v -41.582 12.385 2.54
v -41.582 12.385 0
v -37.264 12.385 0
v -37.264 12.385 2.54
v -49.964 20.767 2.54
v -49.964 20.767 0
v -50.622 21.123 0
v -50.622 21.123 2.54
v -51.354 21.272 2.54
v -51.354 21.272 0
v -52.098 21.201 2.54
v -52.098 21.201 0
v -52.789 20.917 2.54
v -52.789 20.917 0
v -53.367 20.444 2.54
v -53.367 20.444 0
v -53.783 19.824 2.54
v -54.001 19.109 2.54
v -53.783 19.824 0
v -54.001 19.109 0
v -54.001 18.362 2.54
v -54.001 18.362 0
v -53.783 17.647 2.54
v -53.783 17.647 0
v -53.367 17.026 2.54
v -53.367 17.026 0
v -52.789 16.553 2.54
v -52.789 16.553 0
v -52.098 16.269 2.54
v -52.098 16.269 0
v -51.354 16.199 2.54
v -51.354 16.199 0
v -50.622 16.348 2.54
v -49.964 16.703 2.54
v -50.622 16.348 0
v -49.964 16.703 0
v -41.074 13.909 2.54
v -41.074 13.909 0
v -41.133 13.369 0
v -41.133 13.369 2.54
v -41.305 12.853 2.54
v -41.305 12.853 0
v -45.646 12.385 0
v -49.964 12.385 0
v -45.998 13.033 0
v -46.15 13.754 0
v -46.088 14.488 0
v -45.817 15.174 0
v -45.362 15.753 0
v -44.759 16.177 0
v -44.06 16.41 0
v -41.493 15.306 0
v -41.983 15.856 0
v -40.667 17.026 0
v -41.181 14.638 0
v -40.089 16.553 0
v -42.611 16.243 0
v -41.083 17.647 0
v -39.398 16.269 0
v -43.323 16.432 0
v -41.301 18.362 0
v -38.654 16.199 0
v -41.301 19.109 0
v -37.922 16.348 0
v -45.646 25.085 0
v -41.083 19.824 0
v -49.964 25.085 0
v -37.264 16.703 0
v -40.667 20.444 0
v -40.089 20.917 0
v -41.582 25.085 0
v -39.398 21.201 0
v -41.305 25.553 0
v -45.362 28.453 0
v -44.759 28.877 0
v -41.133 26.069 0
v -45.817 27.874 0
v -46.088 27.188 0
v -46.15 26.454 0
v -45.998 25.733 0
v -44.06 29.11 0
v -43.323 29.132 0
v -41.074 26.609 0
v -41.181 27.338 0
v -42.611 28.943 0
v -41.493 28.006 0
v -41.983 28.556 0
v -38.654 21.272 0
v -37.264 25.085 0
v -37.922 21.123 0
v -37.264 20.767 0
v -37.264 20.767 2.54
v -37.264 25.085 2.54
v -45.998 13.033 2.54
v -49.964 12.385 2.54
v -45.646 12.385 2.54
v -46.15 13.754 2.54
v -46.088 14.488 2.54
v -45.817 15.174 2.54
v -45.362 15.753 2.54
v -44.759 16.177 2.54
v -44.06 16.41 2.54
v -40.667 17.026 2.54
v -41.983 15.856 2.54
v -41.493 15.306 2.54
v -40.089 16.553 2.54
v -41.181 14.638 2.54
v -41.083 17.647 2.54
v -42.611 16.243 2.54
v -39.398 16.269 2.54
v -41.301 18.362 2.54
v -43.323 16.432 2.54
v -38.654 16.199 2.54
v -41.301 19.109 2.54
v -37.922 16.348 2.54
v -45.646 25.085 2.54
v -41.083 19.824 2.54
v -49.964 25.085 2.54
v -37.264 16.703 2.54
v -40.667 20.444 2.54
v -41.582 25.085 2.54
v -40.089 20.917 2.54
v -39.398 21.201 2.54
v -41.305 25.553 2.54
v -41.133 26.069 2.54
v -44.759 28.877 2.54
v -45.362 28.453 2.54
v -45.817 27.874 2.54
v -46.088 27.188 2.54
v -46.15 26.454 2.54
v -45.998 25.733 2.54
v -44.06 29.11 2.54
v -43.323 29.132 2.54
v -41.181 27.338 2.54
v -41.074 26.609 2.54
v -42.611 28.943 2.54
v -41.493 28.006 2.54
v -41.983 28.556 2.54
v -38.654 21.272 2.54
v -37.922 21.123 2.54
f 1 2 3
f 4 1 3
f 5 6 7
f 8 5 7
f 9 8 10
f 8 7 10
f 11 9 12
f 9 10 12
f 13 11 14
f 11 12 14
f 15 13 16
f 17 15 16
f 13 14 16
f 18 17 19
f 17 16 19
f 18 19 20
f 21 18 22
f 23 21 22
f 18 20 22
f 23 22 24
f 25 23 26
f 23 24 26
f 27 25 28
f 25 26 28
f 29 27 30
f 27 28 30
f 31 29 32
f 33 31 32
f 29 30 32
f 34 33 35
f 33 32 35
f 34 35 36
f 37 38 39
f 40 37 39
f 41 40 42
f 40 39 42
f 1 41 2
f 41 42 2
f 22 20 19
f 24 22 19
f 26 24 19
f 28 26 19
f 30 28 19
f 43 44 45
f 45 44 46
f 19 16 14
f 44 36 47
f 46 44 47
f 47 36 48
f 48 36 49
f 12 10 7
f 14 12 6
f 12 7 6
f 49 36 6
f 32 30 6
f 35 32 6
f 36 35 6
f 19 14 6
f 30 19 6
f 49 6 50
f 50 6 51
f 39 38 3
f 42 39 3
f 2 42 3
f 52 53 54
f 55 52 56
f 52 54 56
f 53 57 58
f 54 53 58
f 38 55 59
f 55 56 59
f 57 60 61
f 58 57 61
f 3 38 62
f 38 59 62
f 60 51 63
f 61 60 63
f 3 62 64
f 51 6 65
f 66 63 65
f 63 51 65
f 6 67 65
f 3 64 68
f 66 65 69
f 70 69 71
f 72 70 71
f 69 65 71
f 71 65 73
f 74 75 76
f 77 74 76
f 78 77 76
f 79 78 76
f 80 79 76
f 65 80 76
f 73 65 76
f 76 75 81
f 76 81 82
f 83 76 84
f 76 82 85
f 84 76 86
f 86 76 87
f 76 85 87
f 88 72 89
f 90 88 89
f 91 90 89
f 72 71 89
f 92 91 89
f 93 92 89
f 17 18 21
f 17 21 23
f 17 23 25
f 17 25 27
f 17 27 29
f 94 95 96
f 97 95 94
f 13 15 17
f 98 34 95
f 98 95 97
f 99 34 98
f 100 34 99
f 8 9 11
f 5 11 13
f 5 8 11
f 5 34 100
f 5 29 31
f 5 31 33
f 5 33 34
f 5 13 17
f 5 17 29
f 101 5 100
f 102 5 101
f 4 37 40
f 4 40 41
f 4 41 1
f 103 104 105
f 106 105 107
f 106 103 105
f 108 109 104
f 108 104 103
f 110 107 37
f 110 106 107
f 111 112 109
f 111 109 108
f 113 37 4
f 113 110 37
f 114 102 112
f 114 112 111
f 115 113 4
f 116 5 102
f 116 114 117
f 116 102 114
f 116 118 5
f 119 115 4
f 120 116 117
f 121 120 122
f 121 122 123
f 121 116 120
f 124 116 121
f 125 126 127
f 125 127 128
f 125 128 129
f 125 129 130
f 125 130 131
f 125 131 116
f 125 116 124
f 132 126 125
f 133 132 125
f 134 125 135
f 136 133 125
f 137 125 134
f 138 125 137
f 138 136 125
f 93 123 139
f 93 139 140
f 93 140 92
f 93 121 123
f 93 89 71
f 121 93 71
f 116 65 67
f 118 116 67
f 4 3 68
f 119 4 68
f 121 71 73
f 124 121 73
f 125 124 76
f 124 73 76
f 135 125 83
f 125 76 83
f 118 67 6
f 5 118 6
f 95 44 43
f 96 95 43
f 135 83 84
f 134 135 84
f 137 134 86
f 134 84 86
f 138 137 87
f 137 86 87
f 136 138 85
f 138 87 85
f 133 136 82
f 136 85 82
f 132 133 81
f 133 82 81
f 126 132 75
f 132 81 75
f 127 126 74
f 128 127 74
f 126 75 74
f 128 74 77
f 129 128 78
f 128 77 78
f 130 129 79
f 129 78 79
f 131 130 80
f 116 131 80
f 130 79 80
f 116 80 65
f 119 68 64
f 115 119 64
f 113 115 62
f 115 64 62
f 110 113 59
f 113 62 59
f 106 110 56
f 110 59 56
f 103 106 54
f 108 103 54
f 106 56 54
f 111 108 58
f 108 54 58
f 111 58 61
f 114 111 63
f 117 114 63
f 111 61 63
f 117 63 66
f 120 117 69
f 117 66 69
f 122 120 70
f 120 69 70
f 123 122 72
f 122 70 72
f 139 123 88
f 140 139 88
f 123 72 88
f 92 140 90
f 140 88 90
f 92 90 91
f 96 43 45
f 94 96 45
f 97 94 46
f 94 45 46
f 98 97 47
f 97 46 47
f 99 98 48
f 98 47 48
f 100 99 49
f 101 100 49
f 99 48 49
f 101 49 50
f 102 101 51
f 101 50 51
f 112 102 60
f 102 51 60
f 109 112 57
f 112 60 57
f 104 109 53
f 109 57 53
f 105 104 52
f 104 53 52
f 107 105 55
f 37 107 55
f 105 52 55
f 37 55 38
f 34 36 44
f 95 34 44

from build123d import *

# Parameters (mm, degrees)
F1_DEPTH = 2.54


with BuildPart() as f1:
    # F0 (on Top) → F1 (new body)
    with BuildSketch(Plane.XY):
        with BuildLine():
            Line((-49.9644750565, 16.7031875085), (-49.9644750565, 20.7671875085))
            ThreePointArc((-49.9644750565, 20.7671875085), (-54.0284750565, 18.7351875085), (-49.9644750565, 16.7031875085))
        make_face()
        with BuildLine():
            ThreePointArc((-48.9484750565, 18.7351875085), (-49.2166299914, 19.8711100411), (-49.9644750565, 20.7671875085))
            Line((-49.9644750565, 20.7671875085), (-49.9644750565, 16.7031875085))
            ThreePointArc((-49.9644750565, 16.7031875085), (-49.2166299914, 17.599264976), (-48.9484750565, 18.7351875085))
        make_face()
        with BuildLine():
            Line((-45.6464750565, 25.0851875085), (-49.9644750565, 25.0851875085))
            Line((-49.9644750565, 25.0851875085), (-49.9644750565, 20.7671875085))
            ThreePointArc((-49.9644750565, 20.7671875085), (-49.2166299914, 19.8711100411), (-48.9484750565, 18.7351875085))
            ThreePointArc((-48.9484750565, 18.7351875085), (-49.2166299914, 17.599264976), (-49.9644750565, 16.7031875085))
            Line((-49.9644750565, 16.7031875085), (-49.9644750565, 12.3851875085))
            Line((-49.9644750565, 12.3851875085), (-45.6464750565, 12.3851875085))
            ThreePointArc((-45.6464750565, 12.3851875085), (-44.4176935822, 16.3188430856), (-41.0744750565, 13.9091875085))
            ThreePointArc((-41.0744750565, 13.9091875085), (-41.2048194795, 13.1059689828), (-41.5824750565, 12.3851875085))
            Line((-41.5824750565, 12.3851875085), (-37.2644750565, 12.3851875085))
            Line((-37.2644750565, 12.3851875085), (-37.2644750565, 16.7031875085))
            ThreePointArc((-37.2644750565, 16.7031875085), (-41.3284750565, 18.7351875085), (-37.2644750565, 20.7671875085))
            Line((-37.2644750565, 20.7671875085), (-37.2644750565, 25.0851875085))
            Line((-37.2644750565, 25.0851875085), (-41.5824750565, 25.0851875085))
            ThreePointArc((-41.5824750565, 25.0851875085), (-43.6144750565, 24.0691875085), (-45.6464750565, 25.0851875085))
        make_face()
        with BuildLine():
            Line((-41.5824750565, 25.0851875085), (-45.6464750565, 25.0851875085))
            ThreePointArc((-45.6464750565, 25.0851875085), (-43.6144750565, 24.0691875085), (-41.5824750565, 25.0851875085))
        make_face()
        with BuildLine():
            ThreePointArc((-41.0744750565, 26.6091875085), (-44.4176935822, 29.0188430856), (-45.6464750565, 25.0851875085))
            Line((-45.6464750565, 25.0851875085), (-41.5824750565, 25.0851875085))
            ThreePointArc((-41.5824750565, 25.0851875085), (-41.2048194795, 25.8059689828), (-41.0744750565, 26.6091875085))
        make_face()
    extrude(amount=F1_DEPTH)


solid = f1.part
